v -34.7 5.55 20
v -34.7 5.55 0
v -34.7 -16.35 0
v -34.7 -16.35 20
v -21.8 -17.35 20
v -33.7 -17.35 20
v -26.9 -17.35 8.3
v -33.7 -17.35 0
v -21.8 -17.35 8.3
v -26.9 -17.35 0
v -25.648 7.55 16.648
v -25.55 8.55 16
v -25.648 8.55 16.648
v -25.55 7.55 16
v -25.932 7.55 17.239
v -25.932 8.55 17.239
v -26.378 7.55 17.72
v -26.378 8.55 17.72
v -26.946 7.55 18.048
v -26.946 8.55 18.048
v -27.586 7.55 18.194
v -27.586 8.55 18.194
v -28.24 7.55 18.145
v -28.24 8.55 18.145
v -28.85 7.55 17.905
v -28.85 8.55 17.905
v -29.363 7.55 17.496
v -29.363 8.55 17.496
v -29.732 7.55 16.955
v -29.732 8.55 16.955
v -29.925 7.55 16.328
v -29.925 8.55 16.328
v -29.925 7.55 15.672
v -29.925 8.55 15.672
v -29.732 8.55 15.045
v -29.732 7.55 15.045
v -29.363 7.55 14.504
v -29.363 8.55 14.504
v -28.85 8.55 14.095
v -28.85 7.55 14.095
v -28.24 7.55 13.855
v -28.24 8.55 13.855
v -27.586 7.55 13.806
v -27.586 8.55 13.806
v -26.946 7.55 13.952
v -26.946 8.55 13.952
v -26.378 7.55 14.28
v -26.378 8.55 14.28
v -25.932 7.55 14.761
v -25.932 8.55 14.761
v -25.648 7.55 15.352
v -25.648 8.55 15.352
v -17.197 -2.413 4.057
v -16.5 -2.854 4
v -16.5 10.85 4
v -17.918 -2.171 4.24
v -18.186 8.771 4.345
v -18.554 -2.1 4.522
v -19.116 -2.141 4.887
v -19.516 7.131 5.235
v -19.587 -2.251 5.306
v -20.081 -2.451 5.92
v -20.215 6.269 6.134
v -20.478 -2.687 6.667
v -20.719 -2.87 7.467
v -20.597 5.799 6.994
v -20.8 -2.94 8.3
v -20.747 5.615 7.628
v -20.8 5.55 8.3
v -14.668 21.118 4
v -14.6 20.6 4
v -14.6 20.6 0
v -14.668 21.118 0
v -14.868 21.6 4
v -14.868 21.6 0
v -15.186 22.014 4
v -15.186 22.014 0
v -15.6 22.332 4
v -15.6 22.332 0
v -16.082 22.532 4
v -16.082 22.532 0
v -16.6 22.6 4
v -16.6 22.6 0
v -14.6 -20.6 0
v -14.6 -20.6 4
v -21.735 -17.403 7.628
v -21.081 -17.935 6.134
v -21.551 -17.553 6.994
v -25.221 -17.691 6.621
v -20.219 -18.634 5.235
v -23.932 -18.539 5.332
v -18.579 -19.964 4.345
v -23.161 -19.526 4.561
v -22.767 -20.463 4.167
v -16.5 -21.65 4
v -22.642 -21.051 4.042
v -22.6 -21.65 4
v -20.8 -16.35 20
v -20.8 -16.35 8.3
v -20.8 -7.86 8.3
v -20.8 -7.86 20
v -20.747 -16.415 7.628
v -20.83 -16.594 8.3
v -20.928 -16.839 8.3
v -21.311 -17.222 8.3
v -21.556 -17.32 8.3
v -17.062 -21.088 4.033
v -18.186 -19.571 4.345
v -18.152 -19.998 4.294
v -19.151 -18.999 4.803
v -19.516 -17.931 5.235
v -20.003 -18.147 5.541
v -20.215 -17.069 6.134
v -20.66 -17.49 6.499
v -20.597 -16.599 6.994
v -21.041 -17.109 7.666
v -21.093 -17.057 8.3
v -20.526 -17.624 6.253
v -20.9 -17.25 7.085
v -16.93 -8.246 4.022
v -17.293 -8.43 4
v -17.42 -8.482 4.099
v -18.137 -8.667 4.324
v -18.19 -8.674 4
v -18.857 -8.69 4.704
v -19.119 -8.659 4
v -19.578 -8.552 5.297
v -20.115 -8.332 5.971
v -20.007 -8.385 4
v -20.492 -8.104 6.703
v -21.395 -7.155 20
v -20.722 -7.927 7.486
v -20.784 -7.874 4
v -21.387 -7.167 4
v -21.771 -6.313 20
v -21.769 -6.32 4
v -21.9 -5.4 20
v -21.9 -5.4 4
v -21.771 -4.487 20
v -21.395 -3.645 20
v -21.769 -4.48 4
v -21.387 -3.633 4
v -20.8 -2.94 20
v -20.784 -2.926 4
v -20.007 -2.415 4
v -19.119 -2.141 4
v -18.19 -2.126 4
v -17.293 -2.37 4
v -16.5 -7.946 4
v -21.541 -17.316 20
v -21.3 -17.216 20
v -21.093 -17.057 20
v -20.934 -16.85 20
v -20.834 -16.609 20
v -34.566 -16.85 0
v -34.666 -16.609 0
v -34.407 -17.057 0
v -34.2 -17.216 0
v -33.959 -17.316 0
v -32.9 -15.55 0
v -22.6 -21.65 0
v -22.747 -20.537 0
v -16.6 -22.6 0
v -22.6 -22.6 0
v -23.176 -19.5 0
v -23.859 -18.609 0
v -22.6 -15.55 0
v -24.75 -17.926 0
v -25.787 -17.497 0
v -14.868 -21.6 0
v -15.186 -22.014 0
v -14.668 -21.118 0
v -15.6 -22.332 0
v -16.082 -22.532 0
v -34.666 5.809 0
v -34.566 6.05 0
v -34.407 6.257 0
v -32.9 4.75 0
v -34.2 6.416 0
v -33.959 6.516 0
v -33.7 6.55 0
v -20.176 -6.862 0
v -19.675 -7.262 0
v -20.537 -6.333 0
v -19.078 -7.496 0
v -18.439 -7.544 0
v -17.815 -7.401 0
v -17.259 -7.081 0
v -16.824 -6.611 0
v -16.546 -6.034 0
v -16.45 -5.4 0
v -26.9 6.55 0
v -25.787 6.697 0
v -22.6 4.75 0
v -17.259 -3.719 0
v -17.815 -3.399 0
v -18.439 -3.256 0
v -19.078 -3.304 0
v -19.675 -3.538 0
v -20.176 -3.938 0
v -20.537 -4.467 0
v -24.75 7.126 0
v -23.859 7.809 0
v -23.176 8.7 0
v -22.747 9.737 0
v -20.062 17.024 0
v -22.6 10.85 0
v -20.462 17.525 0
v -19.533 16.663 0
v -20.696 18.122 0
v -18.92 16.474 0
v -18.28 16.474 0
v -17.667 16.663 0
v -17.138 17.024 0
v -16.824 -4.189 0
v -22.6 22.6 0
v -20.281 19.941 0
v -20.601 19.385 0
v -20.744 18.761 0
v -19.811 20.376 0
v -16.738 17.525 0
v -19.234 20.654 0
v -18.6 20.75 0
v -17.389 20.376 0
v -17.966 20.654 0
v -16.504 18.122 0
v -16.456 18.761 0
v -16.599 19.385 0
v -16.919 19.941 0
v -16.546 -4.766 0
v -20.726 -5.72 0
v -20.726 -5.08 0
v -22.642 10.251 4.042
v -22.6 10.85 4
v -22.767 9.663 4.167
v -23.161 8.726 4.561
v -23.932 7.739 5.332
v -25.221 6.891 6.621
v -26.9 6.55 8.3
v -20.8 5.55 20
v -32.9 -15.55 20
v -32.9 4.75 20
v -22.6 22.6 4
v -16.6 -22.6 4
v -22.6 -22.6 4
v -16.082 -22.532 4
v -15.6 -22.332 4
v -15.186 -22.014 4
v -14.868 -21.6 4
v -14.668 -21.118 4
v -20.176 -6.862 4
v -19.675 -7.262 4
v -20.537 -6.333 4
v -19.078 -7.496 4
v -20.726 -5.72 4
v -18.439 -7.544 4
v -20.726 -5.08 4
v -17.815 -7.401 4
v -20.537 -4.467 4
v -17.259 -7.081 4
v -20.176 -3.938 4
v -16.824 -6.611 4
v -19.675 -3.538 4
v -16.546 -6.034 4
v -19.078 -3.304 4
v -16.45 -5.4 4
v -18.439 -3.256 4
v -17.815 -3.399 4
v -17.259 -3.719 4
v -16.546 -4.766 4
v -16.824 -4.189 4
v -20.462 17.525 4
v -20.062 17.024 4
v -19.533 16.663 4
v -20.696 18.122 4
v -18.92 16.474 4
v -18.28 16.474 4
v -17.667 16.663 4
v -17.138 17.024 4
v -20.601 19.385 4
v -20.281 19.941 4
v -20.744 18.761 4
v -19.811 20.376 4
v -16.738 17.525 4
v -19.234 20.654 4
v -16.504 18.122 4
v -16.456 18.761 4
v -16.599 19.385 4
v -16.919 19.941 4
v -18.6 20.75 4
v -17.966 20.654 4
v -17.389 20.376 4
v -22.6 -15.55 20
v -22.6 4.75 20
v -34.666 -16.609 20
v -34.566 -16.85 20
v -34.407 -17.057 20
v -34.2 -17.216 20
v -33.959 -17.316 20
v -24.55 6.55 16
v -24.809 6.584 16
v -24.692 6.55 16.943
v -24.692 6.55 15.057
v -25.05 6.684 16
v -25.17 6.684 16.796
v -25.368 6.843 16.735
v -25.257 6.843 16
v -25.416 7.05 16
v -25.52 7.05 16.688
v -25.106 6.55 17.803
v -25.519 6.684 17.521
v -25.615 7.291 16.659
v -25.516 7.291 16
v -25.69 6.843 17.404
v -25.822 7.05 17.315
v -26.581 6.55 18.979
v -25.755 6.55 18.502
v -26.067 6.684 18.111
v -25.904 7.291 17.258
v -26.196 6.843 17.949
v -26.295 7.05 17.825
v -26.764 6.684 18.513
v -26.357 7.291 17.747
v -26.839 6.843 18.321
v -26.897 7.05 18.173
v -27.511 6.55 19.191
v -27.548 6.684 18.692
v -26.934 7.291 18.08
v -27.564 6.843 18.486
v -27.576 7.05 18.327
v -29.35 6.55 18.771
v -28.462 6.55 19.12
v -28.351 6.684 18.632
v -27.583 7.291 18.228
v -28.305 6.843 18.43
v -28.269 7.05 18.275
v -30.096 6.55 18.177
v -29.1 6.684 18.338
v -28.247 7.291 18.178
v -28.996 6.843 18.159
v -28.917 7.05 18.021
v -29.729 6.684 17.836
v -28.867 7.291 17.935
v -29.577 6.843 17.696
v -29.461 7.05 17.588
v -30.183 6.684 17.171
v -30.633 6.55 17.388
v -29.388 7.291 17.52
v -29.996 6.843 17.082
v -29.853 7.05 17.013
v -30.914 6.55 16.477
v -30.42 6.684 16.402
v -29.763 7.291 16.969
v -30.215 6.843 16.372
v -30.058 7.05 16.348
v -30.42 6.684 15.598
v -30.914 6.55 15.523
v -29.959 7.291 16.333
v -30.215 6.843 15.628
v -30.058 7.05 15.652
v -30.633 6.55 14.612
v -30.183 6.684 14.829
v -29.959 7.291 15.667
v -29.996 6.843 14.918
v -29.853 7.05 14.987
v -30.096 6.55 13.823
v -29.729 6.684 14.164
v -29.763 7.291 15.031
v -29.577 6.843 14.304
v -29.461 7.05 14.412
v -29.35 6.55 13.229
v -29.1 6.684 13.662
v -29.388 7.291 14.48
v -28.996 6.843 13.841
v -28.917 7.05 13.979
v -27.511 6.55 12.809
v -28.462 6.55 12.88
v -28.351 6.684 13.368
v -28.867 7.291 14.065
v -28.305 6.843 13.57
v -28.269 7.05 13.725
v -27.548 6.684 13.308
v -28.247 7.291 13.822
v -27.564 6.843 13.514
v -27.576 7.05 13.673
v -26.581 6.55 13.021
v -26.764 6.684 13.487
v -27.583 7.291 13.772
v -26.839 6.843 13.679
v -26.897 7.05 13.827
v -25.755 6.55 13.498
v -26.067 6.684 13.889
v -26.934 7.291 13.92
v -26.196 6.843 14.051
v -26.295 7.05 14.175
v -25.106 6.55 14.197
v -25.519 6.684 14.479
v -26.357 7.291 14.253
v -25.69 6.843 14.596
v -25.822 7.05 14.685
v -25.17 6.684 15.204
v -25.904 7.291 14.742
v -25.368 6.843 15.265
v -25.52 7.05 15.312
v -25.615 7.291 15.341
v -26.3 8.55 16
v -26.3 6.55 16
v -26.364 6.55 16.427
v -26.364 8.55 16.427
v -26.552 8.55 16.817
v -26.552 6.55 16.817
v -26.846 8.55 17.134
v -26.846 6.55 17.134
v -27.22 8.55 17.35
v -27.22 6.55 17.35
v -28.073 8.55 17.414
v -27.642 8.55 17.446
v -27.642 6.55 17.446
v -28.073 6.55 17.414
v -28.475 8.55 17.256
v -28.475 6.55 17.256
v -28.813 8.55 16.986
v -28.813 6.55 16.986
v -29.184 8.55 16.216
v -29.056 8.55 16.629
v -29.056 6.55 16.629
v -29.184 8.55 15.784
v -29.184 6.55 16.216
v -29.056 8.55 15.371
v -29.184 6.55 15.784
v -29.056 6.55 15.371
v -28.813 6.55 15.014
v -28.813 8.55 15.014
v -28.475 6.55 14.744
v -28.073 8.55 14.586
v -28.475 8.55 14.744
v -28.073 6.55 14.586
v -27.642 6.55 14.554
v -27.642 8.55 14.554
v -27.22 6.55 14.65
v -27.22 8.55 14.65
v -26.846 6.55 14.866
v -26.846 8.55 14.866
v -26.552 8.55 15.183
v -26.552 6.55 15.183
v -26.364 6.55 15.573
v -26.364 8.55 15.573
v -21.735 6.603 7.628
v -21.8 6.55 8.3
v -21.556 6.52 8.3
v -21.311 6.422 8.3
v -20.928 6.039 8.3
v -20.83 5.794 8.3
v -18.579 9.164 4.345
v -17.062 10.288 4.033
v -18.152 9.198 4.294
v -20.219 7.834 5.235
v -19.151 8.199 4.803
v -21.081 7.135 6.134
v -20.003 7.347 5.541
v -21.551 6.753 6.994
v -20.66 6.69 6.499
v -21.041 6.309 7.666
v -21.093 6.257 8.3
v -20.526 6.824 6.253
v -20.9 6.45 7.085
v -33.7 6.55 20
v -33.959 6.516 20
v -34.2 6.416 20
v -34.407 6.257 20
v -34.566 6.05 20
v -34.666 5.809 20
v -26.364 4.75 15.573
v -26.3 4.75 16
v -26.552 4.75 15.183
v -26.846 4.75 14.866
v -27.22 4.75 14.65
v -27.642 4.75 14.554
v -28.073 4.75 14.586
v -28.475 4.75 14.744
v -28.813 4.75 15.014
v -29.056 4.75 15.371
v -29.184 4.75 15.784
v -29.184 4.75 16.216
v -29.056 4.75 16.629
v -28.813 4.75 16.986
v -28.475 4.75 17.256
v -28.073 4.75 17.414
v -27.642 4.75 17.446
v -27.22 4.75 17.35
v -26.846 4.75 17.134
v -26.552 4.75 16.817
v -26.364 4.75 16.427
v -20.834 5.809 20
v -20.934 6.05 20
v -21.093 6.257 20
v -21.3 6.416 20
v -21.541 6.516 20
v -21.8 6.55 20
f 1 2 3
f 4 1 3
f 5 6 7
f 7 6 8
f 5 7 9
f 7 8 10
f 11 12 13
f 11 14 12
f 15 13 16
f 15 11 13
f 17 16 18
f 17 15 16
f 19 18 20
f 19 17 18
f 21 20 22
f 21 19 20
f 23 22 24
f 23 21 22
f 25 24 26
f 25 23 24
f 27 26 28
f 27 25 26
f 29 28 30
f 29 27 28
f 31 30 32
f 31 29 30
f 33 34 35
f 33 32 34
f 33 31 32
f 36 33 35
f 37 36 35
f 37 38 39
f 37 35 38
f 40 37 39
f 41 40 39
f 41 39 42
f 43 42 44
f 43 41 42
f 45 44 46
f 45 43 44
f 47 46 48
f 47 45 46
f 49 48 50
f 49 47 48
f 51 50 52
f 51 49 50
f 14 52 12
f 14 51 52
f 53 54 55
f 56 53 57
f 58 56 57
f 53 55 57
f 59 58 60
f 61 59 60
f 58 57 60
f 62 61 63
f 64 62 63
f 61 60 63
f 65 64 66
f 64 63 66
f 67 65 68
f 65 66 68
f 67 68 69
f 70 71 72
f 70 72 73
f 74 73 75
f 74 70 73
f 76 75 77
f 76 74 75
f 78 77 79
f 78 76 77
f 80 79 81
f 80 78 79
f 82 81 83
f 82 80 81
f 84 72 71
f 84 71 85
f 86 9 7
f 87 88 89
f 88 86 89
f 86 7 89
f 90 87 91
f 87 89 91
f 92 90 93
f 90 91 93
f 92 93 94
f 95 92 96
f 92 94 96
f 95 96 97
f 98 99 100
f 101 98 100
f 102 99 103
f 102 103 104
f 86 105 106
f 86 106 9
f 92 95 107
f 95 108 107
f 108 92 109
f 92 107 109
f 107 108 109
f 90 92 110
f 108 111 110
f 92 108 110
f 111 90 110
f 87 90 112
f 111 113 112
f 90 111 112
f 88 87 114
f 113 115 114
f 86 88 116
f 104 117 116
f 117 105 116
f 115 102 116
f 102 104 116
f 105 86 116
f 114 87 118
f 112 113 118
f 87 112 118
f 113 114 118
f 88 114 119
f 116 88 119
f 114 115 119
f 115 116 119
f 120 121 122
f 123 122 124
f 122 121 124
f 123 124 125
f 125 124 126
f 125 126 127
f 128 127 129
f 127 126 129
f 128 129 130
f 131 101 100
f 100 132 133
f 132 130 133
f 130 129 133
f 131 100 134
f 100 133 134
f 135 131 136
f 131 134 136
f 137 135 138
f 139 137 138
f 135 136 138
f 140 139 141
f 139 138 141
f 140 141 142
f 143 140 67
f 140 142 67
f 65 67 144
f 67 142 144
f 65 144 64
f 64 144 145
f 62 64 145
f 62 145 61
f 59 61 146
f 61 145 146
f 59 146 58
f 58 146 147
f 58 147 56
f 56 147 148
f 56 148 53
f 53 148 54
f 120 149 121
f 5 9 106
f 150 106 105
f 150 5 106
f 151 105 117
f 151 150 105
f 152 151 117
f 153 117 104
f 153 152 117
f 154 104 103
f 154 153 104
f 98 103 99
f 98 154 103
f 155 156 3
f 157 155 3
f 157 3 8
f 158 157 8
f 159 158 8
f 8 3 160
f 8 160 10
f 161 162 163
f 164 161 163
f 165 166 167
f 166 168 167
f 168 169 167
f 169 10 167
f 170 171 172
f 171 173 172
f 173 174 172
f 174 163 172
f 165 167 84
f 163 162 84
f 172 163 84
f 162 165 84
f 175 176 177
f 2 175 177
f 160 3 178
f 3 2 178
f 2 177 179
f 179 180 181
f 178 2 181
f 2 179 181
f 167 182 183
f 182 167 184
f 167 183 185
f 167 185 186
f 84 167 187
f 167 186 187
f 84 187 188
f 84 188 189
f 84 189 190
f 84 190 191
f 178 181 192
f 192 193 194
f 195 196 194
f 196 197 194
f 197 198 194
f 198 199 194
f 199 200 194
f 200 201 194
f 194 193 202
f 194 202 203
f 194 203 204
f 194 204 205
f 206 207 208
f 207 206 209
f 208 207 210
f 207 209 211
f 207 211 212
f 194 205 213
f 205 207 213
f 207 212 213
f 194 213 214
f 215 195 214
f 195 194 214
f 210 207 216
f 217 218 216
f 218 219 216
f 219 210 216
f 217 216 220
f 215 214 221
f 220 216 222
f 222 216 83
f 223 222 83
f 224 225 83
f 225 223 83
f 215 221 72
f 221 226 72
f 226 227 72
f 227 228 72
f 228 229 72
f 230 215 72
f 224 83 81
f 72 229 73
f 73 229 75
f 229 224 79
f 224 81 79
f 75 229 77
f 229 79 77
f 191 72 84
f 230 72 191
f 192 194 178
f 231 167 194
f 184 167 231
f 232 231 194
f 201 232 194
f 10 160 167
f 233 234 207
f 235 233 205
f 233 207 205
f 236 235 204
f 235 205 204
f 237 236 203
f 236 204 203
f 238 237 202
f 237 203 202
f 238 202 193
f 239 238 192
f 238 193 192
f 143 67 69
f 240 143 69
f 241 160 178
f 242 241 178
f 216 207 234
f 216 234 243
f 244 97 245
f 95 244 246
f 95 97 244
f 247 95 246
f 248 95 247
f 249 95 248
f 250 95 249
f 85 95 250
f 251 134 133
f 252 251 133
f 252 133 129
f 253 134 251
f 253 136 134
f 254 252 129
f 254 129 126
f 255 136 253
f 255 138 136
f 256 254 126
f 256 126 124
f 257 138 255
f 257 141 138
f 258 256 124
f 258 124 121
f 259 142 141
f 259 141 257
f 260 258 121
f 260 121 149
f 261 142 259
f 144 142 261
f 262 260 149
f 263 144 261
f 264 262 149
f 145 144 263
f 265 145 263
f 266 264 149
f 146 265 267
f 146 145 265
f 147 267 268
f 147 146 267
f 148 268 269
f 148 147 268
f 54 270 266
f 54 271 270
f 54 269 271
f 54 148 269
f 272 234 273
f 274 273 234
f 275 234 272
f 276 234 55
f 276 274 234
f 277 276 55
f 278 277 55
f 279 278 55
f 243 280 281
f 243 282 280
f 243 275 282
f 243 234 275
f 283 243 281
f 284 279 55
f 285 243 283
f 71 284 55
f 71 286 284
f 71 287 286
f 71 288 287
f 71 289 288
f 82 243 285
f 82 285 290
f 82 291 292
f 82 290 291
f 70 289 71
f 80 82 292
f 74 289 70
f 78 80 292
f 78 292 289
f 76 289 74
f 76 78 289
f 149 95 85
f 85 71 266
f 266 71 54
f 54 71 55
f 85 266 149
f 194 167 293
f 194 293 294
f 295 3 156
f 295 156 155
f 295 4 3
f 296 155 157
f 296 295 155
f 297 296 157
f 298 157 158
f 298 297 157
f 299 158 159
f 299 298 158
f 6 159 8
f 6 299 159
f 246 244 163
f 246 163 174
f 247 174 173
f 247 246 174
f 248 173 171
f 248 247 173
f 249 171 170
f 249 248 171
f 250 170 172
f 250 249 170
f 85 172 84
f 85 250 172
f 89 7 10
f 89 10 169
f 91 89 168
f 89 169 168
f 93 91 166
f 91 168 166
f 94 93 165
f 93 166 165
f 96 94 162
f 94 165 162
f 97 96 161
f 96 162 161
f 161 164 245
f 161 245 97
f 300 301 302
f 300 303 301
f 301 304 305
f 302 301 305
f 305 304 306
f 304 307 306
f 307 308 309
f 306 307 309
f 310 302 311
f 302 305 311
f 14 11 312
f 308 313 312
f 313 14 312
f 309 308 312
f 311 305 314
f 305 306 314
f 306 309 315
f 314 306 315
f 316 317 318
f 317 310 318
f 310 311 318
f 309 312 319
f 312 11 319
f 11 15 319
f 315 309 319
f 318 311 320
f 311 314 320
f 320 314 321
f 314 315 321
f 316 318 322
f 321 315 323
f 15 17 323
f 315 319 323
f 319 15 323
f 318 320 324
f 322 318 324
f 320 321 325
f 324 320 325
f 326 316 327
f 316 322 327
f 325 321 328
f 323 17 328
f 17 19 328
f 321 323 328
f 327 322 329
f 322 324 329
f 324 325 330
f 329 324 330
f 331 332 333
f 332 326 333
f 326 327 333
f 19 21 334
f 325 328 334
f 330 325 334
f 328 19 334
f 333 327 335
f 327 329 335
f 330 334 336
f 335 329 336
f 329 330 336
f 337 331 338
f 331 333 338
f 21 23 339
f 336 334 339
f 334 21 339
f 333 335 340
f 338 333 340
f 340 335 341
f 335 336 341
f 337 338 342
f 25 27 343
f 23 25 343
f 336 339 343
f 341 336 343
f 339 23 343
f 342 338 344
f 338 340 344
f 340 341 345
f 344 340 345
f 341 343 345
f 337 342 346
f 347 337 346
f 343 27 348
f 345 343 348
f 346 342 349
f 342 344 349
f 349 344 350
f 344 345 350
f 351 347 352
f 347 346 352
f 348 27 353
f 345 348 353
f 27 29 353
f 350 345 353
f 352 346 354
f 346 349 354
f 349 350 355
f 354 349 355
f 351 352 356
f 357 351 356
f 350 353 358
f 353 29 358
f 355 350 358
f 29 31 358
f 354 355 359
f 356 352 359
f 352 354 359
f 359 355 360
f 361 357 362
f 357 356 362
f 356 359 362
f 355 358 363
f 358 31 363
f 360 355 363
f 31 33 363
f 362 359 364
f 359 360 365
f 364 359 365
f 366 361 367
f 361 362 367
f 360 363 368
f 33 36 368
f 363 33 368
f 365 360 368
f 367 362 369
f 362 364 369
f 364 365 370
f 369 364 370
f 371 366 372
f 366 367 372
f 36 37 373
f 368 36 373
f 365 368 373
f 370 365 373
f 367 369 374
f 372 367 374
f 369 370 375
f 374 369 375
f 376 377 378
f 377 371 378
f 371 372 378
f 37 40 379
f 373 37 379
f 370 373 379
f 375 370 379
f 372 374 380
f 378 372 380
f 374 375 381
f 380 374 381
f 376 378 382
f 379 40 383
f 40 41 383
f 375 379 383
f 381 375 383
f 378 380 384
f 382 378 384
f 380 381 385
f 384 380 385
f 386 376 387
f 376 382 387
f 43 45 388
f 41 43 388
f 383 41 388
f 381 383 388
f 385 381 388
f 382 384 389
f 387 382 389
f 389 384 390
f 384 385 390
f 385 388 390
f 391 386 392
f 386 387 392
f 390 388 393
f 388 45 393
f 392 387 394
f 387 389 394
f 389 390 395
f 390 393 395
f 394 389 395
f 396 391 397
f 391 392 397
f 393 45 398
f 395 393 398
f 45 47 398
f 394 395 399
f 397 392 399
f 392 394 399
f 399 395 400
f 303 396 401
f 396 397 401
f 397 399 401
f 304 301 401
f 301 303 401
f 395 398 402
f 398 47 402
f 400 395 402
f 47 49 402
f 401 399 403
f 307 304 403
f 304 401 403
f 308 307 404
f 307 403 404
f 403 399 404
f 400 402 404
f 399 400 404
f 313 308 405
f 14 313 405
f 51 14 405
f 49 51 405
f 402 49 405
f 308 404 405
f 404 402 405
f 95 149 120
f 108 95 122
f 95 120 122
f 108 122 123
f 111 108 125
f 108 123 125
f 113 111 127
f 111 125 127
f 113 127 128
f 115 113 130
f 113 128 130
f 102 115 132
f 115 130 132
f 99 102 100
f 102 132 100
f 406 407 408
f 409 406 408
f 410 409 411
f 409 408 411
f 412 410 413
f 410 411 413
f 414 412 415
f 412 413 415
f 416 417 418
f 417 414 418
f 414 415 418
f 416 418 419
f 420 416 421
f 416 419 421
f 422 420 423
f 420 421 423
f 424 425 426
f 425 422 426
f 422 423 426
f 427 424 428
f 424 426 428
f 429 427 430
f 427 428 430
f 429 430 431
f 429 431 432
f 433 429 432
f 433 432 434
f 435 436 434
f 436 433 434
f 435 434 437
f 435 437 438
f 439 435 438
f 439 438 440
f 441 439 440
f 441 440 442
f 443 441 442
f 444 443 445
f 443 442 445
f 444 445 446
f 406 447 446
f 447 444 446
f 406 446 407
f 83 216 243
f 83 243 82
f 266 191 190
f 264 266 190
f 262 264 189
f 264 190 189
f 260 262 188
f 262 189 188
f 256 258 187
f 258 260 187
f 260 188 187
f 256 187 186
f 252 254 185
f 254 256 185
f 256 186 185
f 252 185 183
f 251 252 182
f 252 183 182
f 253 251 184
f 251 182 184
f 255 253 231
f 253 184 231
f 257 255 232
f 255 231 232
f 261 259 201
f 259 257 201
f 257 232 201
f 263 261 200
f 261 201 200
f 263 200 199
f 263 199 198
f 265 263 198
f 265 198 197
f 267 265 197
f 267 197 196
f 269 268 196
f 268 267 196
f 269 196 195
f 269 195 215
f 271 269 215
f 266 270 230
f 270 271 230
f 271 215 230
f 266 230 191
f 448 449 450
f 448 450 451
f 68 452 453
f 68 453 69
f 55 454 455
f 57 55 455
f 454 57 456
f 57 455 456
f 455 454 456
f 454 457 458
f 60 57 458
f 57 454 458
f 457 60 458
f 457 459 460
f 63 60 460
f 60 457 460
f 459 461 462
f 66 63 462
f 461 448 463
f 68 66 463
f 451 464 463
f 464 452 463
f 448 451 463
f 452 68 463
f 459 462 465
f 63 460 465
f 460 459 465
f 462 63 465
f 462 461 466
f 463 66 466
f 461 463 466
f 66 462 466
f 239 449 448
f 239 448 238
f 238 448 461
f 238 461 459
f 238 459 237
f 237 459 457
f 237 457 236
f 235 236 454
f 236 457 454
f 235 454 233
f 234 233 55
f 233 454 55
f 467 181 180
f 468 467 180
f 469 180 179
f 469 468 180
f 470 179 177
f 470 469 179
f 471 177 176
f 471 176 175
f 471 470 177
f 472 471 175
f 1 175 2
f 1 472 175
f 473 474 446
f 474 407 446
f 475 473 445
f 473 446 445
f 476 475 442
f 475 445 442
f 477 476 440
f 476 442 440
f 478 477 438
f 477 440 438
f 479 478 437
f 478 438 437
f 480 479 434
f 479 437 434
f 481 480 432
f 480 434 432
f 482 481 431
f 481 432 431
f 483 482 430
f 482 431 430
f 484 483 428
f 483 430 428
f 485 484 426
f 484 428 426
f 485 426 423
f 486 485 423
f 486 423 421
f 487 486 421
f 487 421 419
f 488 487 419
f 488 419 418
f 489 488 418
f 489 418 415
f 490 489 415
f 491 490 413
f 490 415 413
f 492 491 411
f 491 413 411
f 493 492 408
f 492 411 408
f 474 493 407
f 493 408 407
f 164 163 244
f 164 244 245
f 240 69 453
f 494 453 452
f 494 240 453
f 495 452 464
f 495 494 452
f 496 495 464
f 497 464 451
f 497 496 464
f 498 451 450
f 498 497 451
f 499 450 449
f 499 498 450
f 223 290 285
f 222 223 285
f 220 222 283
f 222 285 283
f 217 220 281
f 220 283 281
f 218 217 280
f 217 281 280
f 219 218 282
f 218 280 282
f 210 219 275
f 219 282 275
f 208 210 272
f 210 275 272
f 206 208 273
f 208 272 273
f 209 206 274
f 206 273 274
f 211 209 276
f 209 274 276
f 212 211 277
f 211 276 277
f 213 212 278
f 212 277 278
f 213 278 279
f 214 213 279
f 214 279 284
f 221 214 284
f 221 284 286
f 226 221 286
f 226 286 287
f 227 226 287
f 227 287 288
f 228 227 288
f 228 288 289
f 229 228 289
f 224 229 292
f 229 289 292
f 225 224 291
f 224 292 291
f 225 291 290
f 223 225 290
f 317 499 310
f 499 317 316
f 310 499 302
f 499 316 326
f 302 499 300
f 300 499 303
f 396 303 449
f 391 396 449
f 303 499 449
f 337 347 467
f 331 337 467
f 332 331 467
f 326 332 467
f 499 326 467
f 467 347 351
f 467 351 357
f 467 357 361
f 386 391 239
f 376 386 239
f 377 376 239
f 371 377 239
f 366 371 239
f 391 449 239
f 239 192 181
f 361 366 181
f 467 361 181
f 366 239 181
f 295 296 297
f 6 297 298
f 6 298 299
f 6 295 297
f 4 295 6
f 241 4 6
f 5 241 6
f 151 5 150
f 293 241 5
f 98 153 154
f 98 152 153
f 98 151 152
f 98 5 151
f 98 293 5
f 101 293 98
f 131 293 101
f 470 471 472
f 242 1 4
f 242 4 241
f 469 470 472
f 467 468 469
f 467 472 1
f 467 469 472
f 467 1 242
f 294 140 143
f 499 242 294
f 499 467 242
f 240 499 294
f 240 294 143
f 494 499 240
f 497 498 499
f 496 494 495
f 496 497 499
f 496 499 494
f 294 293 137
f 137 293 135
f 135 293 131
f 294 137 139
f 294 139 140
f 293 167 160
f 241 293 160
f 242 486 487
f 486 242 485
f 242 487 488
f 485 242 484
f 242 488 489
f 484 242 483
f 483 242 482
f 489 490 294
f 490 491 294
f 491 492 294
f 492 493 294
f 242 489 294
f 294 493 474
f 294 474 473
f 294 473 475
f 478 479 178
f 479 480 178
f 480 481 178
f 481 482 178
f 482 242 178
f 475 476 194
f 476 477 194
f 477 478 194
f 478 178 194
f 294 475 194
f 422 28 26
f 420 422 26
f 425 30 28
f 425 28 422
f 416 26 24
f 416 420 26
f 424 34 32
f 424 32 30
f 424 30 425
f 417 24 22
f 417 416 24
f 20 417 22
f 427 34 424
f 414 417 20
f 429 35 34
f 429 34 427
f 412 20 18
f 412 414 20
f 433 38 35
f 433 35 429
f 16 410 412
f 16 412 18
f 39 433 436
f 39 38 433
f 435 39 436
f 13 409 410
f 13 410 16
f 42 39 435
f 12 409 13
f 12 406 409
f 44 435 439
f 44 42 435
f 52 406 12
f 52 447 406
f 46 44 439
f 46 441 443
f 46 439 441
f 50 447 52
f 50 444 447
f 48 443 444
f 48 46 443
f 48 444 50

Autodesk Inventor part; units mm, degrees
ref_plane "YZ Plane" through (0, 0, 0) normal (1, 0, 0) x (0, 1, 0)
ref_plane "XZ Plane" through (0, 0, 0) normal (0, 1, 0) x (-1, 0, 0)
ref_plane "XY Plane" through (0, 0, 0) normal (0, 0, 1) x (1, 0, 0)
sketch "Sketch1" plane through (0, 0, 0) normal (0, 0, 1) x (1, 0, 0)
  line L0 (-22.6, 22.6) -> (-14.6, 22.6)
  line L1 (-14.6, 22.6) -> (-14.6, -22.6)
  line L2 (-14.6, -22.6) -> (-22.6, -22.6)
  line L3 (-22.6, -22.6) -> (-22.6, 22.6)
  line L4 (5.4, -5.4) -> (-38.7938, -5.4) construction
  line L5 (-22.6, -5.4) -> (-27.75, -5.4) construction
  line L6 (-32.9, 4.75) -> (-22.6, 4.75)
  line L7 (-22.6, 4.75) -> (-22.6, -15.55)
  line L8 (-22.6, -15.55) -> (-32.9, -15.55)
  line L9 (-32.9, -15.55) -> (-32.9, 4.75)
  line L10 (-32.9, 4.75) -> (-22.6, -15.55) construction
  line L11 (-22.6, 4.75) -> (-32.9, -15.55) construction
  line L12 (-20.8, 6.55) -> (-34.7, 6.55)
  line L13 (-34.7, 6.55) -> (-34.7, -17.35)
  line L14 (-34.7, -17.35) -> (-20.8, -17.35)
  line L15 (-20.8, -17.35) -> (-20.8, 6.55)
  line L16 (-22.6, 22.6) -> (-22.6, 18.6) construction
  line L17 (-22.6, 18.6) -> (-18.6, 18.6) construction
  line L18 (-18.6, 18.6) -> (-18.6, -5.4) construction
  circle A0 centre (-18.6, -5.4) radius 3.3
  circle A1 centre (-18.6, -5.4) radius 2.15
  point P0 (-22.6, 6.55)
  point P1 (-22.6, -17.35)
  point P2 (-20.8, -2.9403)
  point P3 (-20.8, -7.8597)
  dimension "d0" = 8
  dimension "d1" = 45.2
  dimension "d2" = 5.15
  dimension "d3" = 10.3
  dimension "d4" = 20.3
  dimension "d5" = 1.8
  dimension "d10" = 4
  dimension "d11" = 4
  dimension "d12" = 24
  dimension "d32" = 6.6
  dimension "d35" = 4.3
extrude "Extrusion1" add sketch "Sketch1" along normal blind 20 contours L12 L15 A0 L14 L3 | L3 L6 L9 L8 L14 L13 L12 | L15 A0 picked at (-20.9741, -4.7782)
extrude "Extrusion2" add sketch "Sketch1" along normal blind 4 contours L0 L1 L2 L3 L14 L15 A0 L12 | A0 L15 | A1 picked at (-15.7123, -5.1492)
hole "Hole1" at (-18.6, 18.6, 0) at (-18.6, -5.4, 0) direction (0, 0, 1) diameter 4.3 depth 5 tip angle 118
fillet "Fillet1" radius 4.3 5 edges at (-20.8, -5.4, 4) (-21.7, 6.55, 4) (-21.7, -17.35, 4) (-22.6, 6.55, 2) (-22.6, -17.35, 2)
fillet "Fillet3" radius 1 8 edges at (-34.7, 6.55, 10) (-34.7, -17.35, 10) (-23.85, 6.55, 8.3) (-19.55, 10.85, 4) (-20.8, 6.55, 14.15) (-23.85, -17.35, 8.3) (-19.55, -21.65, 4) (-20.8, -17.35, 14.15)
sketch "Sketch2" plane through (-26.9, 6.55, 8.3) normal (0, 1, 0) x (1, 0, 0)
  line L0 (6.1, -11.7) -> (6.1, 0) construction
  line L1 (-7.8, 8.3) -> (-7.8, -11.7) construction
  line L2 (6.1, -11.7) -> (-7.8, -11.7) construction
  line L3 (-7.8, -11.7) -> (-7.8, -3.7) construction
  line L4 (-7.8, -3.7) -> (6.1, -3.7) construction
  line L5 (6.1, -3.7) -> (6.1, -11.7) construction
  line L6 (-7.8, -11.7) -> (6.1, -3.7) construction
  circle A0 centre (-0.85, -7.7) radius 1.45
  circle A1 centre (-0.85, -7.7) radius 2.2
  point P0 (26.9, 8.3)
  dimension "d23" = 8
  dimension "d24" = 2.9
  dimension "d25" = 0.75
extrude "Extrusion3" add sketch "Sketch2" along normal blind 2
fillet "Fillet4" radius 2 2 edges at (-14.6, 22.6, 2) (-14.6, -22.6, 2)
fillet "Fillet5" radius 1 1 edges at (-29.95, 6.55, 16)
extrude "Extrusion4" cut sketch "Sketch2" against normal blind 2 contours A0
extrude "Extrusion5" cut sketch "Sketch1" along normal blind 20 contours A0 L15 | L15 A0 | A1
extrude "Extrusion6" add sketch "Sketch1" along normal blind 4 contours A0 L15 picked at (-15.7123, -5.1492)
extrude "Extrusion7" add sketch "Sketch1" along normal blind 4 contours L15 A0 picked at (-20.9741, -4.7782)
properties material "ABS Plastic"
